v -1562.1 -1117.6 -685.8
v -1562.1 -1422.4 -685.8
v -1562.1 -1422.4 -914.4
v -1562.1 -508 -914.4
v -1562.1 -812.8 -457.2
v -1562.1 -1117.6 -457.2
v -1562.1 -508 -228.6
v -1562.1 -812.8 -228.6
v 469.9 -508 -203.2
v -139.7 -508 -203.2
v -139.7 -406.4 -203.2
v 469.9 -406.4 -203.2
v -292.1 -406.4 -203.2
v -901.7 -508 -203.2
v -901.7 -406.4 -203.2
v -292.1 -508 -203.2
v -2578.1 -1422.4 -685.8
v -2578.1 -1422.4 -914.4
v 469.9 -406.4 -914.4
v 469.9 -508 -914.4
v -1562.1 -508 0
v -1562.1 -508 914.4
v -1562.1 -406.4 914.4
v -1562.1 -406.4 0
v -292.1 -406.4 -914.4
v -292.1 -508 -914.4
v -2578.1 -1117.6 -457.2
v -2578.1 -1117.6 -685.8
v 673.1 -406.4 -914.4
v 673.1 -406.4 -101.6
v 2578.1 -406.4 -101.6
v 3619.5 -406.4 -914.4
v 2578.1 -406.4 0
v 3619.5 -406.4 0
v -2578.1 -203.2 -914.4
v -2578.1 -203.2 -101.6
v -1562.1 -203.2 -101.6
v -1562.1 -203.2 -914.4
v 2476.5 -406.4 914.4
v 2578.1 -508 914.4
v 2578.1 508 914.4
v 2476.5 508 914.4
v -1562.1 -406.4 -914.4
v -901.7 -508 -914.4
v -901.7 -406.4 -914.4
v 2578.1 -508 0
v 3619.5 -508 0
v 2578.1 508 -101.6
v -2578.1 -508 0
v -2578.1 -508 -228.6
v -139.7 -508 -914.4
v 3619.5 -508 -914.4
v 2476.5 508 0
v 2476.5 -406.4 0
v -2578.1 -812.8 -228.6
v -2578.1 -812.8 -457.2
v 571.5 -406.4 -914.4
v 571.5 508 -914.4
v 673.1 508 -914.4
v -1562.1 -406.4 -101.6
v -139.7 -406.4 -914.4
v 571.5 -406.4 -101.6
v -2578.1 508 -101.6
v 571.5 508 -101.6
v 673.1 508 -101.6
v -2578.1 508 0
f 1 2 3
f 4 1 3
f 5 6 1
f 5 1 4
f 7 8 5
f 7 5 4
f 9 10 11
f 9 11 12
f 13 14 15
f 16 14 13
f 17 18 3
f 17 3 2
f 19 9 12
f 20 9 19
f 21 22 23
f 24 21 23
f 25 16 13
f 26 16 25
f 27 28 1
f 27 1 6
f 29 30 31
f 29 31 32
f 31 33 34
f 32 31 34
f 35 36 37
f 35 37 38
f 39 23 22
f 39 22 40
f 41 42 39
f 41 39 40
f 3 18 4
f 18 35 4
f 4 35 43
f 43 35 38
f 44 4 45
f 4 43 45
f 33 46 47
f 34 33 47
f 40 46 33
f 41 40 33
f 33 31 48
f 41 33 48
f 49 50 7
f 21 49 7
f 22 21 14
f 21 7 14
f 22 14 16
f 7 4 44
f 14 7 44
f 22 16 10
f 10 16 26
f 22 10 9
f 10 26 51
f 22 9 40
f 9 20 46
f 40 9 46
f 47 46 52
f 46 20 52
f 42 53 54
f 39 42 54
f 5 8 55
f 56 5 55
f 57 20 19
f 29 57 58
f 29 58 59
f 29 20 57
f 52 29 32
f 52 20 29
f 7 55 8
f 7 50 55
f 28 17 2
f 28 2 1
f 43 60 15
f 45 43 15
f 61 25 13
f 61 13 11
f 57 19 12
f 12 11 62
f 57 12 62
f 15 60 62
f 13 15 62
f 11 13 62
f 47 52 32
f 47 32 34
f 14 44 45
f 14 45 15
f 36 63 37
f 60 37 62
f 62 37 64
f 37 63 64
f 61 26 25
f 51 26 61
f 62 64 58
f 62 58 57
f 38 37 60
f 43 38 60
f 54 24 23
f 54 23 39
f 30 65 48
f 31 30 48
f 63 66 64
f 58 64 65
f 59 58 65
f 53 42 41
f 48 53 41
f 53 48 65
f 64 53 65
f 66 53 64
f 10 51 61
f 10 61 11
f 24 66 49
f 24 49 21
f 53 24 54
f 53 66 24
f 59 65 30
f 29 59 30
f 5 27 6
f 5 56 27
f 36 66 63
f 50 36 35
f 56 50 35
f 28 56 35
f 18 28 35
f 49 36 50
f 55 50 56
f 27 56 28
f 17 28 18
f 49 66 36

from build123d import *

# Parameters (mm, degrees)
F0_W      = 5156.2
F0_H      = 1016
F1_DEPTH  = 101.6
F3_DEPTH  = 1016
F5_DEPTH  = 101.6
F7_DEPTH  = 685.8
F9_DEPTH  = 228.6
F11_DEPTH = 228.6
F13_DEPTH = 914.4
F14_W     = 101.6
F14_H     = 914.4
F15_DEPTH = 812.8
F16_W     = 2895.6
F16_H     = 914.4
F17_DEPTH = 101.6
F18_W     = 609.6
F18_H     = 914.4
F19_DEPTH = 914.401
F20_W     = 609.6
F20_H     = 101.6
F21_DEPTH = 914.4


with BuildPart() as f1:
    # F0 (on Top) → F1 (new body)
    with BuildSketch(Plane.XY):
        Rectangle(F0_W, F0_H)
    extrude(amount=-F1_DEPTH)

    # F2 (on face) → F3 (join)
    with BuildSketch(Plane(origin=(-2578.1, 0, 0), x_dir=(0, -1, 0), z_dir=(-1, 0, 0))):
        Polygon((508, -228.6), (508, 0), (203.2, 0), (203.2, -914.4), (1422.4, -914.4), (1422.4, -685.8), (1117.6, -685.8), (1117.6, -457.2), (812.8, -457.2), (812.8, -228.6), align=None)
    extrude(amount=-F3_DEPTH)

    # F4 (on face) → F5 (join)
    with BuildSketch(Plane.XZ.offset(508)):
        Polygon((723.9, -101.6), (-1562.1, -101.6), (-1562.1, -228.6), (-1562.1, -914.4), (-901.7, -914.4), (-901.7, -203.2), (-292.1, -203.2), (-292.1, -914.4), (-139.7, -914.4), (-139.7, -203.2), (469.9, -203.2), (469.9, -914.4), (723.9, -914.4), align=None)
    extrude(amount=-F5_DEPTH)

    # F6 (on face) → F7 (join, through all)
    with BuildSketch(Plane.XY.offset(-228.6)):
        Polygon((-952.5, -508), (-1562.1, -508), (-1562.1, -1422.4), align=None)
    extrude(amount=-F7_DEPTH)

    # F8 (on face) → F9 (cut, through all)
    with BuildSketch(Plane.XY.offset(-228.6)):
        Polygon((-1155.7, -812.8), (-1562.1, -812.8), (-1562.1, -1422.4), align=None)
    extrude(amount=-F9_DEPTH, mode=Mode.SUBTRACT)

    # F10 (on face) → F11 (cut, through all)
    with BuildSketch(Plane.XY.offset(-457.2)):
        Polygon((-1358.9, -1117.6), (-1562.1, -1117.6), (-1562.1, -1422.4), align=None)
    extrude(amount=-F11_DEPTH, mode=Mode.SUBTRACT)

    # F12 (on face) → F13 (join)
    with BuildSketch(Plane.XY):
        Polygon((-952.5, -406.4), (-952.5, -508), (2578.1, -508), (2578.1, -406.4), (2578.1, 508), (2476.5, 508), (2476.5, -406.4), align=None)
    extrude(amount=F13_DEPTH)

    # F14 (on face) → F15 (join, through all)
    with BuildSketch(Plane(origin=(0, 0, -101.6), x_dir=(1, 0, 0), z_dir=(0, 0, -1))):
        with Locations((622.3, -50.8)):
            Rectangle(F14_W, F14_H)
    extrude(amount=F15_DEPTH)

    # F16 (on face) → F17 (join)
    with BuildSketch(Plane.XZ.offset(508)):
        with Locations((2171.7, -457.2)):
            Rectangle(F16_W, F16_H)
    extrude(amount=-F17_DEPTH)

    # F18 (on face) → F19 (cut, through all)
    with BuildSketch(Plane.XY):
        with Locations((-1257.3, -965.2)):
            Rectangle(F18_W, F18_H)
    extrude(amount=-F19_DEPTH, mode=Mode.SUBTRACT)

    # F20 (on face) → F21 (join, through all)
    with BuildSketch(Plane.XY):
        with Locations((-1257.3, -457.2)):
            Rectangle(F20_W, F20_H)
    extrude(amount=F21_DEPTH)


solid = f1.part
